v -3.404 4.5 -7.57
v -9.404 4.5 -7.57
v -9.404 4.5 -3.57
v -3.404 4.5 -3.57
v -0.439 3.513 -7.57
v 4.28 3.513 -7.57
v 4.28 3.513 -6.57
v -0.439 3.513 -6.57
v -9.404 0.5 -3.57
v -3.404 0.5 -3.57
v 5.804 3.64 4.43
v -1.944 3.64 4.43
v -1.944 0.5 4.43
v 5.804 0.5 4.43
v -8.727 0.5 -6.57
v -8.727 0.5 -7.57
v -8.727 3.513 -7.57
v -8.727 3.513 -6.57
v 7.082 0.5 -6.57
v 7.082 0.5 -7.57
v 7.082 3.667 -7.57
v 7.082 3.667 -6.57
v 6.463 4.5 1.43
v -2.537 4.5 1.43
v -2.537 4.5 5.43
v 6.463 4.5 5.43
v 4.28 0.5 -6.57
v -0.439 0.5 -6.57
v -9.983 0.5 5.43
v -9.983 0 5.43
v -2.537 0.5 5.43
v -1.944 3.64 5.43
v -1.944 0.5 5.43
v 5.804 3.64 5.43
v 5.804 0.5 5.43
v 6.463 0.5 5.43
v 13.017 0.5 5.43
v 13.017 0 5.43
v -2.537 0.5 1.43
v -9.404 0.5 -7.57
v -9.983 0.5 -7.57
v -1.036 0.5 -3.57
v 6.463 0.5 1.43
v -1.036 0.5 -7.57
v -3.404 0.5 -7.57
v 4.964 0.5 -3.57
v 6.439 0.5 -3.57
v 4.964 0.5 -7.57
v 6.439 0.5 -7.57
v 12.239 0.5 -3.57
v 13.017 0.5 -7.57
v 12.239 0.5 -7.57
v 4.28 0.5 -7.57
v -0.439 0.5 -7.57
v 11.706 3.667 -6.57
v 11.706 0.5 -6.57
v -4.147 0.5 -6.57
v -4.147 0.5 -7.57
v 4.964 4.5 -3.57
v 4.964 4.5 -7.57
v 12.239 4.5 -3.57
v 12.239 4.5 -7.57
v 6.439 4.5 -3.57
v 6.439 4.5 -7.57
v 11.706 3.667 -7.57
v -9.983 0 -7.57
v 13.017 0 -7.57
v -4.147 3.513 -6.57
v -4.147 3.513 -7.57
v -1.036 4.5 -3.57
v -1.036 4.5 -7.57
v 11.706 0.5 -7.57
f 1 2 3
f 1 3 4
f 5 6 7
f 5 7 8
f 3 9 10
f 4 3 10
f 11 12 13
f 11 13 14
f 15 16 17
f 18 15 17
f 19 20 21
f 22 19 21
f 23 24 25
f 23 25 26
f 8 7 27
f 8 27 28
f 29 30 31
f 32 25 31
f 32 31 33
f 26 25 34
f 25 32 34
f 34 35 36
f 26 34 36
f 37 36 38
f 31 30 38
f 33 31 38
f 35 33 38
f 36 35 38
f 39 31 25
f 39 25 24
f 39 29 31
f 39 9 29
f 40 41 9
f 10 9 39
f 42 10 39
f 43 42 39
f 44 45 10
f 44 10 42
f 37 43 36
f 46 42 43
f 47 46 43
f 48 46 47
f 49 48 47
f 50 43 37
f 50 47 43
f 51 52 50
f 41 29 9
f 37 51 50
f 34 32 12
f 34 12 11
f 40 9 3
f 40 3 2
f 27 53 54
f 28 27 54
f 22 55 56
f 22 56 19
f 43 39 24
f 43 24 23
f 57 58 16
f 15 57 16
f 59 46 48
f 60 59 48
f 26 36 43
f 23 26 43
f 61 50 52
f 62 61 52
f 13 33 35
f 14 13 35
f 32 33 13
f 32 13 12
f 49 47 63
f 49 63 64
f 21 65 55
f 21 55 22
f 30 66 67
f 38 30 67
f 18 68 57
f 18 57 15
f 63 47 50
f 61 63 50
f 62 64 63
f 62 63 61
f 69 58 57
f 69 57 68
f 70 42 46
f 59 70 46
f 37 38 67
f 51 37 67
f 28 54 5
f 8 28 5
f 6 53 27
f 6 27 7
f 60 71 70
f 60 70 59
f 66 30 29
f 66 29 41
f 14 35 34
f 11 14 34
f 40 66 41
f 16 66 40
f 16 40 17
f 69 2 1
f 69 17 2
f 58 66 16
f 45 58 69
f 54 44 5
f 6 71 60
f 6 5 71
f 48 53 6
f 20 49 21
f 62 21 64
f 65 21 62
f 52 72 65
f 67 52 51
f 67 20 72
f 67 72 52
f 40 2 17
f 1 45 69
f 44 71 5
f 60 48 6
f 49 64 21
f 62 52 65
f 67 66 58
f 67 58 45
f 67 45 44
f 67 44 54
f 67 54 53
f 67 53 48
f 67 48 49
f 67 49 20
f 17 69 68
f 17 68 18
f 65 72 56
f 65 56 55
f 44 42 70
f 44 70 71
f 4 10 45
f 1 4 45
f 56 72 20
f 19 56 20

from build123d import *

# Parameters (mm, degrees)
SKETCH1_W           = 23
SKETCH1_H           = 13
BOSS_EXTRUDE1_DEPTH = 0.5
SKETCH2_W           = 5.8
SKETCH2_H           = 4
SKETCH2_W_2         = 6
SKETCH2_W_3         = 9
BOSS_EXTRUDE2_DEPTH = 4
SKETCH3_W           = 4.624085026
SKETCH3_H           = 3.166867164
SKETCH3_W_2         = 4.718514666
SKETCH3_H_2         = 3.013327786
SKETCH3_W_3         = 4.580400568
CUT_EXTRUDE1_DEPTH  = 1
SKETCH4_W           = 7.748769295
SKETCH4_H           = 3.140290714
CUT_EXTRUDE2_DEPTH  = 1


with BuildPart() as part:
    # Sketch1 → Boss-Extrude1 (new body)
    with BuildSketch(Plane(origin=(0, 0, 0), x_dir=(1, 0, 0), z_dir=(0, 1, 0))):
        with Locations((1.517204559, 1.070232191)):
            Rectangle(SKETCH1_W, SKETCH1_H)
    extrude(amount=BOSS_EXTRUDE1_DEPTH)

    # Sketch2 → Boss-Extrude2 (add)
    with BuildSketch(Plane(origin=(0, 0.5, 0), x_dir=(1, 0, 0), z_dir=(0, 1, 0))):
        with Locations((9.339285907, 5.570232191)):
            Rectangle(SKETCH2_W, SKETCH2_H)
        with Locations((-6.403857402, 5.570232191)):
            Rectangle(SKETCH2_W_2, SKETCH2_H)
        with Locations((1.963830733, 5.570232191)):
            Rectangle(SKETCH2_W_2, SKETCH2_H)
        with Locations((1.962518624, -3.429767809)):
            Rectangle(SKETCH2_W_3, SKETCH2_H)
    extrude(amount=BOSS_EXTRUDE2_DEPTH)

    # Sketch3 → Cut-Extrude1 (cut)
    with BuildSketch(Plane(origin=(0, 0, -7.570232191), x_dir=(-1, 0, 0), z_dir=(0, 0, -1))):
        with Locations((-9.393748211, 2.083433582)):
            Rectangle(SKETCH3_W, SKETCH3_H)
        with Locations((-1.920682759, 2.006663893)):
            Rectangle(SKETCH3_W_2, SKETCH3_H_2)
        with Locations((6.437297708, 2.006663893)):
            Rectangle(SKETCH3_W_3, SKETCH3_H_2)
    extrude(amount=-CUT_EXTRUDE1_DEPTH, mode=Mode.SUBTRACT)

    # Sketch4 → Cut-Extrude2 (cut)
    with BuildSketch(Plane.XY.offset(5.429767809)):
        with Locations((1.929978032, 2.070145357)):
            Rectangle(SKETCH4_W, SKETCH4_H)
    extrude(amount=-CUT_EXTRUDE2_DEPTH, mode=Mode.SUBTRACT)


solid = part.part
